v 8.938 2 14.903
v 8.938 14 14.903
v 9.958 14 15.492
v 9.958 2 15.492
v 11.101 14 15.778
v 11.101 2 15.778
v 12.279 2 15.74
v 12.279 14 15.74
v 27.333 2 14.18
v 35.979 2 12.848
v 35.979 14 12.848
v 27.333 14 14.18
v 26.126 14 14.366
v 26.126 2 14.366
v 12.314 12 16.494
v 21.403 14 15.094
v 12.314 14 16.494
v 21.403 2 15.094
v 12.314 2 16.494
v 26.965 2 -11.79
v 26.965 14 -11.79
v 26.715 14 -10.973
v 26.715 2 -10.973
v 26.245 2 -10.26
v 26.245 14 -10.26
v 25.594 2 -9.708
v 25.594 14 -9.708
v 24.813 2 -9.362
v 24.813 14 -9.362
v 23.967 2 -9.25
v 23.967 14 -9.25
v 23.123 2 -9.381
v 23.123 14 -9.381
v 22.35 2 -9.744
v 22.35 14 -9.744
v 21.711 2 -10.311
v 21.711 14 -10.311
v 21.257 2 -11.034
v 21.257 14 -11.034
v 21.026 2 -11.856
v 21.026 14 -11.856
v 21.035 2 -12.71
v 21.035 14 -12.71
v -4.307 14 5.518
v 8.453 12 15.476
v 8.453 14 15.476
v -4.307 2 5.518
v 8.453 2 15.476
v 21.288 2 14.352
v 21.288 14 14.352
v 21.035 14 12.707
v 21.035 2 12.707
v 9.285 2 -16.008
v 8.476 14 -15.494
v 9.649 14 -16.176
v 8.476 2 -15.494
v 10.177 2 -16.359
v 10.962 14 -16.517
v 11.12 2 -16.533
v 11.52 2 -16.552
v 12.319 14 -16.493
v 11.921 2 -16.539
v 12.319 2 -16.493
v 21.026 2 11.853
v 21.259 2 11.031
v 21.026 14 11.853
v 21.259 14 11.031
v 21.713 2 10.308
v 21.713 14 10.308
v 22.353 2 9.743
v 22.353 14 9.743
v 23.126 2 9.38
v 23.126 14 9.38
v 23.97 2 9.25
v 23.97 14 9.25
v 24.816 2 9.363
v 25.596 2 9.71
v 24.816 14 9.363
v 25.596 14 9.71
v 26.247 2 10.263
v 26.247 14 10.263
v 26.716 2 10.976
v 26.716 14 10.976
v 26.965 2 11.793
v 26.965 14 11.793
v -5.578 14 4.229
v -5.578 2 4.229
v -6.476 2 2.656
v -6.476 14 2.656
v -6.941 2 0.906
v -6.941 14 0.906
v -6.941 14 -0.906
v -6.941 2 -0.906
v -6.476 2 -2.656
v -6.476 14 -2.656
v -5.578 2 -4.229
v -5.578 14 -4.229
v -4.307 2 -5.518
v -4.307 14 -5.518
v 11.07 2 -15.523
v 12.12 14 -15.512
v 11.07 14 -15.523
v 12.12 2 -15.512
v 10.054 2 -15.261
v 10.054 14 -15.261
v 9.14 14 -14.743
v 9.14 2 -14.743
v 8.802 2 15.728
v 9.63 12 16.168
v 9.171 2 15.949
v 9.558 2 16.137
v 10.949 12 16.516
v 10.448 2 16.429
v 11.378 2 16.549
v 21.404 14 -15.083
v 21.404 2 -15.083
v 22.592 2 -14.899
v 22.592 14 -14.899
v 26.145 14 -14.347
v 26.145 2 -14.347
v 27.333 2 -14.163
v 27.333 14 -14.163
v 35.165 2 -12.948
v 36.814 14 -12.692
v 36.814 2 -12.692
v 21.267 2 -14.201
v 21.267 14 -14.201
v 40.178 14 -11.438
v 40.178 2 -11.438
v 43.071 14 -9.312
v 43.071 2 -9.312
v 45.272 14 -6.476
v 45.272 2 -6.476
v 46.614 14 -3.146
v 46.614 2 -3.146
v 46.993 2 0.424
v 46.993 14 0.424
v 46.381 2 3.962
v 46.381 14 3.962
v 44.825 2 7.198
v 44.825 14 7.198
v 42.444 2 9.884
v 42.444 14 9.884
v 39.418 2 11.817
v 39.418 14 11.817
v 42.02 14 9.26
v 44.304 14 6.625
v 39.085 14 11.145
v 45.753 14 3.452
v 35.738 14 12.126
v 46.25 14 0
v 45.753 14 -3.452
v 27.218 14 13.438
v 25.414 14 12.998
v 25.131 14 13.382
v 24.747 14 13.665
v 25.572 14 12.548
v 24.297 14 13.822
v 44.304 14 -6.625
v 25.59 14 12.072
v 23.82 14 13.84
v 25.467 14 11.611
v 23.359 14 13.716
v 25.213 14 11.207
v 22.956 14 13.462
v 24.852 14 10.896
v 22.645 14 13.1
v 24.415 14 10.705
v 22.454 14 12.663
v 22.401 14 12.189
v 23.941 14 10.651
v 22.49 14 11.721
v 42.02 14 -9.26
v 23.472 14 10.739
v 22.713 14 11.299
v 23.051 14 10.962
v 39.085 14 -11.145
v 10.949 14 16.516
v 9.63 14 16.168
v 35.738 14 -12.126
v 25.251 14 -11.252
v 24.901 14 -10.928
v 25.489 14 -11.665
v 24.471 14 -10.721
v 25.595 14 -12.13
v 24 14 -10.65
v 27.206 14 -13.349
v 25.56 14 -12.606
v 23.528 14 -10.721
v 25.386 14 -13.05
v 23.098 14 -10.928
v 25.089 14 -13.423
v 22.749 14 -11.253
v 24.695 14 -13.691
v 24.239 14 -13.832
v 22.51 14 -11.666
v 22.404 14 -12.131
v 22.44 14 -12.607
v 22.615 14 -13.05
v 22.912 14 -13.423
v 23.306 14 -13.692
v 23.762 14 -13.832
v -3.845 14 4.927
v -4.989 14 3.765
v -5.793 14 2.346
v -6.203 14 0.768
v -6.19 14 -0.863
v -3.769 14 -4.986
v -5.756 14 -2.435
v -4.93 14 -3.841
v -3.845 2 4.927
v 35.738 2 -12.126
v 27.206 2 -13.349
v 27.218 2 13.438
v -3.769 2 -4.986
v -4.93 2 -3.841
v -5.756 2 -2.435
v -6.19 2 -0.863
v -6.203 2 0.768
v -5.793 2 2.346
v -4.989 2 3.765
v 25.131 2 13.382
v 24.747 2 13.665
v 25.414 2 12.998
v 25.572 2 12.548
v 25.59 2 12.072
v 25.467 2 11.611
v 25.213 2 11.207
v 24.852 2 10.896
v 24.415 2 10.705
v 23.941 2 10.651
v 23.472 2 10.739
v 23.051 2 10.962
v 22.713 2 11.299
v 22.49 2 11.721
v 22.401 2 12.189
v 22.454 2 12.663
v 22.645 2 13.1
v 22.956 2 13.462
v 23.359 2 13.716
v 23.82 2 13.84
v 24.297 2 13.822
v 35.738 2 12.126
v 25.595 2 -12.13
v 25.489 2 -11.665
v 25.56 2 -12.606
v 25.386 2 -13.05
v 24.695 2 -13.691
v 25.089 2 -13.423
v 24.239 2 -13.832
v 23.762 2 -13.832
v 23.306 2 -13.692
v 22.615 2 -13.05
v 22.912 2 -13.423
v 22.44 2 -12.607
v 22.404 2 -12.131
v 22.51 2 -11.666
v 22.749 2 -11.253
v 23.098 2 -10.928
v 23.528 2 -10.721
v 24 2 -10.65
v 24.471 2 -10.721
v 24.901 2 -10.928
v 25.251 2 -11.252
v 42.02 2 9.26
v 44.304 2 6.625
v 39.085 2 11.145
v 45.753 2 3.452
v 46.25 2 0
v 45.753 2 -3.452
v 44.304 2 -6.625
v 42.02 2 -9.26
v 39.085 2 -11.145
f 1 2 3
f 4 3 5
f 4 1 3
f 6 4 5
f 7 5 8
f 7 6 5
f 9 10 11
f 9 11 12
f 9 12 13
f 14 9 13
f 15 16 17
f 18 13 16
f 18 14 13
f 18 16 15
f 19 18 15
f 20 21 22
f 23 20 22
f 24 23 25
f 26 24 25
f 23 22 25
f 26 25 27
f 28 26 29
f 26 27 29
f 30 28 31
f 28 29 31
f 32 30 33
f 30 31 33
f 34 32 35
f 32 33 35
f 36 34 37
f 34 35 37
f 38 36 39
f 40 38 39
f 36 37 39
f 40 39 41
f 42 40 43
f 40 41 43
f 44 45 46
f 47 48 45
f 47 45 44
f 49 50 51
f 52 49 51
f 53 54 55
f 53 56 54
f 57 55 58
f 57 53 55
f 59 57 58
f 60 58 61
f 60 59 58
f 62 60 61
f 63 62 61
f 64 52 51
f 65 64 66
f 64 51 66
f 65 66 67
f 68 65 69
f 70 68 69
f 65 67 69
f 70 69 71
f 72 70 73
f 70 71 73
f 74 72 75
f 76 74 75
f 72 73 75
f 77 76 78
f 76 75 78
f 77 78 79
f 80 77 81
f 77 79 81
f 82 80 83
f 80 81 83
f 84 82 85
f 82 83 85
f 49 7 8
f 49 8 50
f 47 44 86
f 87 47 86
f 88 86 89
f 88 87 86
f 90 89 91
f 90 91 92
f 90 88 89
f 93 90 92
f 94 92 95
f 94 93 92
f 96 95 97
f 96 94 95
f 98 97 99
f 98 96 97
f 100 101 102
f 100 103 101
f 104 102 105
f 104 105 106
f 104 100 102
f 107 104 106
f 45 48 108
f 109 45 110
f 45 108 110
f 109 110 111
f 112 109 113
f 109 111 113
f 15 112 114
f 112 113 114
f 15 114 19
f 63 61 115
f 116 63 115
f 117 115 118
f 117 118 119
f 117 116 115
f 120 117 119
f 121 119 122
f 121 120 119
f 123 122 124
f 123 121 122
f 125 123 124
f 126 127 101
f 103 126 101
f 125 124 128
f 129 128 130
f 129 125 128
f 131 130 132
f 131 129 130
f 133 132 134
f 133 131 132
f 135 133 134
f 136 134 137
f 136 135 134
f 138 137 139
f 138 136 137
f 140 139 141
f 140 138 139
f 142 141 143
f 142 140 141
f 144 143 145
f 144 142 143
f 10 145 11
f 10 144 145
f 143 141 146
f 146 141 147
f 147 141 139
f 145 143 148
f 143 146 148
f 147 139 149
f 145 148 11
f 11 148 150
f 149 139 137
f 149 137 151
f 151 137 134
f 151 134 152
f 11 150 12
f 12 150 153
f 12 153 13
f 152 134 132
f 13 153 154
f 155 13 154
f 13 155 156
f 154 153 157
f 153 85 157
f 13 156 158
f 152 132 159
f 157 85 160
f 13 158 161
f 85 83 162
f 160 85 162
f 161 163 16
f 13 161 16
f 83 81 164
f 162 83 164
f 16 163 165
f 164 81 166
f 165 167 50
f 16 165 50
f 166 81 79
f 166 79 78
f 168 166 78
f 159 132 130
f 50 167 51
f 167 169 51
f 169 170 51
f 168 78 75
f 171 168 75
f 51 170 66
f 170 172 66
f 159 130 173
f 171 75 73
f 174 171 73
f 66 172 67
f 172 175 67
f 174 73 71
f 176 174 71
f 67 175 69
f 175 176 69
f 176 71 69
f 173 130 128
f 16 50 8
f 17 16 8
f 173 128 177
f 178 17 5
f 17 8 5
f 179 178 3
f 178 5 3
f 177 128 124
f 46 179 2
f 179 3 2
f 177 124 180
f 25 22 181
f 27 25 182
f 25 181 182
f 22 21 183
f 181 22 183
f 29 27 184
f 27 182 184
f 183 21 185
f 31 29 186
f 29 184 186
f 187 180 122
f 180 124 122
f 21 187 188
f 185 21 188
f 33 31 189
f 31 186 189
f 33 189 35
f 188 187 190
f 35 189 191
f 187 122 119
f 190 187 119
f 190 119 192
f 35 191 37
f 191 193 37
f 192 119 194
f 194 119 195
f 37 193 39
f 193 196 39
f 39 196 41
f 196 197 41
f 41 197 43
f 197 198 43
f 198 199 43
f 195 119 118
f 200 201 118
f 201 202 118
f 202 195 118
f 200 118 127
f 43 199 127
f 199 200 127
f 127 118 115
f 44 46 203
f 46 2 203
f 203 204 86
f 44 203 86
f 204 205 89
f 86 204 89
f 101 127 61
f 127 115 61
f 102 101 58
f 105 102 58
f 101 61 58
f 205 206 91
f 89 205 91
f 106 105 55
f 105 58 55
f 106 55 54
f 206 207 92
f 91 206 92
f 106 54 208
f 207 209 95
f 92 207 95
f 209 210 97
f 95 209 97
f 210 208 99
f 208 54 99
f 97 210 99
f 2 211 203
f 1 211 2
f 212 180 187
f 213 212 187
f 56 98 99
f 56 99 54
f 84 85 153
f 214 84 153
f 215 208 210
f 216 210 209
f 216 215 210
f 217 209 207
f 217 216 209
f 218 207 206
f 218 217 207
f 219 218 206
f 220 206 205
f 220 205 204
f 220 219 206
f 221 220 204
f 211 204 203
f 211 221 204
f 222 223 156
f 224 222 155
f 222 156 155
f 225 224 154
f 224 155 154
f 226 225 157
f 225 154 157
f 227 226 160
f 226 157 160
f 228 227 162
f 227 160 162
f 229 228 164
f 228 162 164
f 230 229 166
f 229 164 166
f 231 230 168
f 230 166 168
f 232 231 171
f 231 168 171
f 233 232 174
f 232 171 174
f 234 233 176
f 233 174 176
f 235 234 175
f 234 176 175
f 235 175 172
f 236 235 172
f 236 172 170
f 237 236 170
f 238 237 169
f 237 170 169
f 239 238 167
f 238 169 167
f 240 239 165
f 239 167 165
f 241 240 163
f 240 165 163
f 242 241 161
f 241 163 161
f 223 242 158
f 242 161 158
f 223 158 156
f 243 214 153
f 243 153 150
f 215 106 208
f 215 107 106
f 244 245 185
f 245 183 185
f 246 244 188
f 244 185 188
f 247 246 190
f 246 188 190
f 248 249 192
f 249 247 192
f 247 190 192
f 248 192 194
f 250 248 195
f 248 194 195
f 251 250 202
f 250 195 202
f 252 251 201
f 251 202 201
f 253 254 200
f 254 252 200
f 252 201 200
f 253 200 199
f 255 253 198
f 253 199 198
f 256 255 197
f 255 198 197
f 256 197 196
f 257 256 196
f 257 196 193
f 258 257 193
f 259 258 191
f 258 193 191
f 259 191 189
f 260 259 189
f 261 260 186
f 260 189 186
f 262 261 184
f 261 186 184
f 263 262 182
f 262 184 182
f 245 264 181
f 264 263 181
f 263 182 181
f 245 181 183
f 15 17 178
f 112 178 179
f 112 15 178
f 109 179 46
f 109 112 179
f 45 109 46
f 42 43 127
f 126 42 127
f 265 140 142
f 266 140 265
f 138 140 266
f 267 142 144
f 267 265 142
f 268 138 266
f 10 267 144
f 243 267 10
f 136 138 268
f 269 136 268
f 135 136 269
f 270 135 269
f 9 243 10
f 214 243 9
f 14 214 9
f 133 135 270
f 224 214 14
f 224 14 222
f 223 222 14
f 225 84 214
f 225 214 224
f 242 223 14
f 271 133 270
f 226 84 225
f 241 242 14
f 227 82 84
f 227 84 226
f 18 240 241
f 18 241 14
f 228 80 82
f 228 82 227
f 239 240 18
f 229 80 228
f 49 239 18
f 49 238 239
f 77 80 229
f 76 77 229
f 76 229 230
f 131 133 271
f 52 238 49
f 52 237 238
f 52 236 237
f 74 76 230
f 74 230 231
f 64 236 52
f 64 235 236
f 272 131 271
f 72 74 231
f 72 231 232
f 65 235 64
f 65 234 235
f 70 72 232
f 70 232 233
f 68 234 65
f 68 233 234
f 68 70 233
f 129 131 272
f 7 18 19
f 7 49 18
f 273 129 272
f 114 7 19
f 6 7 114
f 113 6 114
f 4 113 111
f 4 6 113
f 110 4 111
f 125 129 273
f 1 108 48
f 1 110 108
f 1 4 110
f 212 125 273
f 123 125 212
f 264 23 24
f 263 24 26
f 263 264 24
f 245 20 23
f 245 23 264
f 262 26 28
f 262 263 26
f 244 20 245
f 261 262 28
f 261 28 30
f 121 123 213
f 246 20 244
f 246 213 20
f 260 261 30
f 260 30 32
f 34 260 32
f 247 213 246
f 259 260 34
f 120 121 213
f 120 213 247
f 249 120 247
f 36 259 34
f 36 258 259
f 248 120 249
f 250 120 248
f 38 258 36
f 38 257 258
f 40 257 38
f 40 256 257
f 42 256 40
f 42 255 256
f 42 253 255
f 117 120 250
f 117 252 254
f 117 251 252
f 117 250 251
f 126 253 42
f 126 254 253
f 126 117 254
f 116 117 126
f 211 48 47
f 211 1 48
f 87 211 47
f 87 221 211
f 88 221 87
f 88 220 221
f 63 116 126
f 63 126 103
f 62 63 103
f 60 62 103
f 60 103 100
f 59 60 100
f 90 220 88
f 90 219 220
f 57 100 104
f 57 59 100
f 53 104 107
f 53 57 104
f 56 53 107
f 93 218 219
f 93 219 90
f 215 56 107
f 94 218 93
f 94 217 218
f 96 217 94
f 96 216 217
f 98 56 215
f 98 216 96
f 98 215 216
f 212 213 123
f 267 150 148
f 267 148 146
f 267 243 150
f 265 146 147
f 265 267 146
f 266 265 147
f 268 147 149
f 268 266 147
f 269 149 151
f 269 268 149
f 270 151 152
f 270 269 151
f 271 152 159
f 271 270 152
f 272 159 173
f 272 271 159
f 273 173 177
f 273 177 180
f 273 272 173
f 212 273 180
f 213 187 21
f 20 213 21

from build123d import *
from build123d.topology import SkipClean

# Parameters (mm, degrees)
SKETCH1_R               = 1.6
SKETCH1_R_2             = 1
SKETCH1_R_3             = 5.5
SKETCH1_R_4             = 4.5
BOSS_EXTRUDE2_DEPTH     = 2
BOSS_EXTRUDE3_START     = -2
SKETCH2_R               = 1
BOSS_EXTRUDE3_DEPTH     = 2
SKETCH3_R               = 1
CUT_EXTRUDE1_DEPTH      = 103
BOSS_EXTRUDE4_OUTLINE_R = 1
BOSS_EXTRUDE4_DEPTH     = 10
SKETCH5_R               = 87.063932705
CUT_EXTRUDE2_DEPTH      = 2
SKETCH6_R               = 1
BOSS_EXTRUDE5_DEPTH     = 2
SKETCH7_R               = 1.6
BOSS_EXTRUDE6_DEPTH     = 12
SKETCH8_R               = 1.6
CUT_EXTRUDE3_DEPTH      = 12


# Read off the part's stored shape, not the designer's step: Boss-Extrude4
with BuildPart() as part:
    # Sketch1 → Boss-Extrude2 (new body)
    with BuildSketch(Plane(origin=(0, 0, 0), x_dir=(1, 0, 0), z_dir=(0, 1, 0))):
        with BuildLine():
            Line((12.313589515, -16.493996637), (35.979225245, -12.848450001))
            ThreePointArc((35.979225245, -12.848450001), (46.993067566, -0.424494085), (36.813648041, 12.691862933))
            Line((36.813648041, 12.691862933), (35.165189196, 12.947676785))
            Line((35.165189196, 12.947676785), (12.319067304, 16.493021261))
            ThreePointArc((12.319067304, 16.493021261), (11.720527595, 16.549330191), (11.119556233, 16.533395936))
            Line((11.119556233, 16.533395936), (-11.812019178, 14.541098507))
            ThreePointArc((-11.812019178, 14.541098507), (-13.247239988, 14.027709898), (-14.244912332, 12.87528787))
            Line((-14.244912332, 12.87528787), (-19.487592157, 2.204884721))
            ThreePointArc((-19.487592157, 2.204884721), (-19.693653105, -1.723258696), (-16.994761113, -4.584858569))
            Line((-16.994761113, -4.584858569), (9.557587922, -16.137143667))
            ThreePointArc((9.557587922, -16.137143667), (10.910298182, -16.51089082), (12.313589515, -16.493996637))
        make_face()
        with Locations(Location((11.552349036, -11.552285098, 0), (0, 0, 270))):
            Circle(SKETCH1_R, mode=Mode.SUBTRACT)
        with Locations(Location((25, -11, 0), (0, 0, 270))):
            Circle(SKETCH1_R_2, mode=Mode.SUBTRACT)
        with Locations(Location((-15, 0, 0), (0, 0, 270))):
            Circle(SKETCH1_R, mode=Mode.SUBTRACT)
        with Locations(Location((0, 0, 0), (0, 0, 270))):
            Circle(SKETCH1_R_3, mode=Mode.SUBTRACT)
        with Locations(Location((-11.552357038, 11.552357038, 0), (0, 0, 270))):
            Circle(SKETCH1_R, mode=Mode.SUBTRACT)
        with Locations(Location((11.552326466, 11.552160153, 0), (0, 0, 270))):
            Circle(SKETCH1_R, mode=Mode.SUBTRACT)
        with Locations(Location((14, 0, 0), (0, 0, 270))):
            Circle(SKETCH1_R_4, mode=Mode.SUBTRACT)
        with Locations(Location((34, 0, 0), (0, 0, 270))):
            Circle(SKETCH1_R_4, mode=Mode.SUBTRACT)
        with Locations(Location((25, 11, 0), (0, 0, 270))):
            Circle(SKETCH1_R_2, mode=Mode.SUBTRACT)
    extrude(amount=BOSS_EXTRUDE2_DEPTH)

    # Sketch2 → Boss-Extrude3 (add)
    with BuildSketch(Plane(origin=(0, 2, 0), x_dir=(1, 0, 0), z_dir=(0, 1, 0)).offset(BOSS_EXTRUDE3_START)):
        with Locations((25, 11)):
            Circle(SKETCH2_R)
        with Locations((25, -11)):
            Circle(SKETCH2_R)
    extrude(amount=BOSS_EXTRUDE3_DEPTH)

    # Sketch3 → Cut-Extrude1 (cut)
    with BuildSketch(Plane(origin=(0, 2, 0), x_dir=(1, 0, 0), z_dir=(0, 1, 0))):
        with Locations(Location((24, 13, 0), (0, 0, 270))):
            Circle(SKETCH3_R)
        with Locations(Location((24, -13, 0), (0, 0, 270))):
            Circle(SKETCH3_R)
    extrude(amount=-CUT_EXTRUDE1_DEPTH, mode=Mode.SUBTRACT)

    # Boss-Extrude4 outline → Boss-Extrude4 (add)
    with SkipClean():  # the faces are left unmerged after this step: merging them gives an invalid solid
        with BuildSketch(Plane(origin=(0, 2, 0), x_dir=(1, 0, 0), z_dir=(0, 1, 0))):
            with BuildLine():
                ThreePointArc((8.453372169, -15.47610242), (10.277484332, -16.387026041), (12.313589515, -16.493996637))
                Line((12.313589515, -16.493996637), (35.979225245, -12.848450001))
                ThreePointArc((35.979225245, -12.848450001), (46.993067566, -0.424494085), (36.813648041, 12.691862933))
                Line((36.813648041, 12.691862933), (12.319067304, 16.493021261))
                ThreePointArc((12.319067304, 16.493021261), (10.294223964, 16.391290043), (8.476229775, 15.493940099))
                Line((8.476229775, 15.493940099), (-4.306535369, 5.518491924))
                ThreePointArc((-4.306535369, 5.518491924), (-7, 0), (-4.306535369, -5.518491924))
                Line((-4.306535369, -5.518491924), (8.453372169, -15.47610242))
            make_face()
            with Locations((24, -13)):
                Circle(BOSS_EXTRUDE4_OUTLINE_R, mode=Mode.SUBTRACT)
            with BuildLine():
                Line((35.738243971, -12.126046672), (26.117255626, -13.608064851))
                Line((26.117255626, -13.608064851), (25.976685738, -12.695511096))
                ThreePointArc((25.976685738, -12.695511096), (23.695511096, -11.023314262), (22.023314262, -13.304488904))
                Line((22.023314262, -13.304488904), (22.16388415, -14.217042659))
                Line((22.16388415, -14.217042659), (12.27862862, -15.739768587))
                ThreePointArc((12.27862862, -15.739768587), (10.519552717, -15.67488522), (8.937649363, -14.902784407))
                Line((8.937649363, -14.902784407), (-3.845146577, -4.927204867))
                ThreePointArc((-3.845146577, -4.927204867), (-6.249813783, 0.048245957), (-3.768620923, 4.985979978))
                Line((-3.768620923, 4.985979978), (9.140409076, 14.743187339))
                ThreePointArc((9.140409076, 14.743187339), (10.553310252, 15.425397379), (12.119916334, 15.511685597))
                Line((12.119916334, 15.511685597), (22.133828609, 14.076211769))
                Line((22.133828609, 14.076211769), (22.020237278, 13.283794934))
                ThreePointArc((22.020237278, 13.283794934), (23.716205066, 11.020237278), (25.979762722, 12.716205066))
                Line((25.979762722, 12.716205066), (26.093354053, 13.508621901))
                Line((26.093354053, 13.508621901), (35.738243971, 12.126046672))
                ThreePointArc((35.738243971, 12.126046672), (46.25, 0), (35.738243971, -12.126046672))
            make_face(mode=Mode.SUBTRACT)
            with Locations((24, 13)):
                Circle(BOSS_EXTRUDE4_OUTLINE_R, mode=Mode.SUBTRACT)
        extrude(amount=BOSS_EXTRUDE4_DEPTH)
    add(part.part.scale(1), mode=Mode.REPLACE)  # the faces are merged on a copy

    # Sketch5 → Cut-Extrude2 (cut)
    with BuildSketch(Plane(origin=(0, 0, 0), x_dir=(-1, 0, 0), z_dir=(0, -1, 0))):
        Circle(SKETCH5_R)
    extrude(amount=-CUT_EXTRUDE2_DEPTH, mode=Mode.SUBTRACT)

    # Sketch6 → Boss-Extrude5 (add)
    with SkipClean():  # the faces are left unmerged after this step: merging them gives an invalid solid
        with BuildSketch(Plane(origin=(0, 12, 0), x_dir=(1, 0, 0), z_dir=(0, 1, 0))):
            with BuildLine():
                Line((-4.306535369, 5.518491924), (8.476229775, 15.493940099))
                ThreePointArc((8.476229775, 15.493940099), (10.294223964, 16.391290043), (12.319067304, 16.493021261))
                Line((12.319067304, 16.493021261), (36.813648041, 12.691862933))
                ThreePointArc((36.813648041, 12.691862933), (46.993067566, -0.424494085), (35.979225245, -12.848450001))
                Line((35.979225245, -12.848450001), (12.313589515, -16.493996637))
                ThreePointArc((12.313589515, -16.493996637), (10.277484331, -16.387026041), (8.453372169, -15.47610242))
                Line((8.453372169, -15.47610242), (-4.306535369, -5.518491924))
                ThreePointArc((-4.306535369, -5.518491924), (-7, 0), (-4.306535369, 5.518491924))
            make_face()
            with Locations(Location((24, -13, 0), (0, 0, 270))):
                Circle(SKETCH6_R, mode=Mode.SUBTRACT)
            with Locations(Location((24, 13, 0), (0, 0, 270))):
                Circle(SKETCH6_R, mode=Mode.SUBTRACT)
            with BuildLine():
                Line((35.738243971, 12.126046672), (26.093354053, 13.508621901))
                Line((26.093354053, 13.508621901), (25.979762722, 12.716205066))
                ThreePointArc((25.979762722, 12.716205066), (23.716205066, 11.020237278), (22.020237278, 13.283794934))
                Line((22.020237278, 13.283794934), (22.133828609, 14.076211769))
                Line((22.133828609, 14.076211769), (12.119916334, 15.511685597))
                ThreePointArc((12.119916334, 15.511685597), (10.553310252, 15.425397379), (9.140409076, 14.743187339))
                Line((9.140409076, 14.743187339), (-3.768620923, 4.985979978))
                ThreePointArc((-3.768620923, 4.985979978), (-6.249813783, 0.048245957), (-3.845146577, -4.927204867))
                Line((-3.845146577, -4.927204867), (8.937649363, -14.902784407))
                ThreePointArc((8.937649363, -14.902784407), (10.519552717, -15.67488522), (12.27862862, -15.739768587))
                Line((12.27862862, -15.739768587), (22.16388415, -14.217042659))
                Line((22.16388415, -14.217042659), (22, -13))
                ThreePointArc((22, -13), (23.847309916, -11.005837083), (25.976685738, -12.695511096))
                Line((25.976685738, -12.695511096), (26.117255626, -13.608064851))
                Line((26.117255626, -13.608064851), (35.738243971, -12.126046672))
                ThreePointArc((35.738243971, -12.126046672), (46.25, 0), (35.738243971, 12.126046672))
            make_face(mode=Mode.SUBTRACT)
        extrude(amount=BOSS_EXTRUDE5_DEPTH)

    # Sketch7 → Boss-Extrude6 (add)
    # profile 1 of 2: a face of its own
    with BuildSketch(Plane(origin=(0, 14, 0), x_dir=(1, 0, 0), z_dir=(0, 1, 0))):
        with BuildLine():
            Line((22.591660568, 14.898882792), (26.144897094, 14.347478595))
            Line((26.144897094, 14.347478595), (27.332795496, 14.163136191))
            Line((27.332795496, 14.163136191), (26.964516665, 11.789955497))
            ThreePointArc((26.964516665, 11.789955497), (23.539955497, 9.285483335), (21.035483335, 12.710044503))
            Line((21.035483335, 12.710044503), (21.403762166, 15.083225196))
            Line((21.403762166, 15.083225196), (22.591660568, 14.898882792))
        make_face()
        with Locations((24, 12.25)):
            Circle(SKETCH7_R, mode=Mode.SUBTRACT)
    # profile 2 of 2: a face of its own
    with BuildSketch(Plane(origin=(0, 14, 0), x_dir=(1, 0, 0), z_dir=(0, 1, 0))):
        with BuildLine():
            Line((26.126412864, -14.366215568), (21.402696028, -15.093875294))
            Line((21.402696028, -15.093875294), (21.034973077, -12.706744287))
            ThreePointArc((21.034973077, -12.706744287), (23.543255713, -9.284973077), (26.965026923, -11.793255713))
            Line((26.965026923, -11.793255713), (27.332749874, -14.18038672))
            Line((27.332749874, -14.18038672), (26.126412864, -14.366215568))
        make_face()
        with Locations((24, -12.25)):
            Circle(SKETCH7_R, mode=Mode.SUBTRACT)
    extrude(amount=-BOSS_EXTRUDE6_DEPTH)

    # Sketch8 → Cut-Extrude3 (cut)
    with BuildSketch(Plane(origin=(0, 14, 0), x_dir=(1, 0, 0), z_dir=(0, 1, 0))):
        with Locations(Location((24, -12.25, 0), (0, 0, 270))):
            Circle(SKETCH8_R)
        with Locations(Location((24, 12.25, 0), (0, 0, 270))):
            Circle(SKETCH8_R)
    extrude(amount=-CUT_EXTRUDE3_DEPTH, mode=Mode.SUBTRACT)


solid = part.part
